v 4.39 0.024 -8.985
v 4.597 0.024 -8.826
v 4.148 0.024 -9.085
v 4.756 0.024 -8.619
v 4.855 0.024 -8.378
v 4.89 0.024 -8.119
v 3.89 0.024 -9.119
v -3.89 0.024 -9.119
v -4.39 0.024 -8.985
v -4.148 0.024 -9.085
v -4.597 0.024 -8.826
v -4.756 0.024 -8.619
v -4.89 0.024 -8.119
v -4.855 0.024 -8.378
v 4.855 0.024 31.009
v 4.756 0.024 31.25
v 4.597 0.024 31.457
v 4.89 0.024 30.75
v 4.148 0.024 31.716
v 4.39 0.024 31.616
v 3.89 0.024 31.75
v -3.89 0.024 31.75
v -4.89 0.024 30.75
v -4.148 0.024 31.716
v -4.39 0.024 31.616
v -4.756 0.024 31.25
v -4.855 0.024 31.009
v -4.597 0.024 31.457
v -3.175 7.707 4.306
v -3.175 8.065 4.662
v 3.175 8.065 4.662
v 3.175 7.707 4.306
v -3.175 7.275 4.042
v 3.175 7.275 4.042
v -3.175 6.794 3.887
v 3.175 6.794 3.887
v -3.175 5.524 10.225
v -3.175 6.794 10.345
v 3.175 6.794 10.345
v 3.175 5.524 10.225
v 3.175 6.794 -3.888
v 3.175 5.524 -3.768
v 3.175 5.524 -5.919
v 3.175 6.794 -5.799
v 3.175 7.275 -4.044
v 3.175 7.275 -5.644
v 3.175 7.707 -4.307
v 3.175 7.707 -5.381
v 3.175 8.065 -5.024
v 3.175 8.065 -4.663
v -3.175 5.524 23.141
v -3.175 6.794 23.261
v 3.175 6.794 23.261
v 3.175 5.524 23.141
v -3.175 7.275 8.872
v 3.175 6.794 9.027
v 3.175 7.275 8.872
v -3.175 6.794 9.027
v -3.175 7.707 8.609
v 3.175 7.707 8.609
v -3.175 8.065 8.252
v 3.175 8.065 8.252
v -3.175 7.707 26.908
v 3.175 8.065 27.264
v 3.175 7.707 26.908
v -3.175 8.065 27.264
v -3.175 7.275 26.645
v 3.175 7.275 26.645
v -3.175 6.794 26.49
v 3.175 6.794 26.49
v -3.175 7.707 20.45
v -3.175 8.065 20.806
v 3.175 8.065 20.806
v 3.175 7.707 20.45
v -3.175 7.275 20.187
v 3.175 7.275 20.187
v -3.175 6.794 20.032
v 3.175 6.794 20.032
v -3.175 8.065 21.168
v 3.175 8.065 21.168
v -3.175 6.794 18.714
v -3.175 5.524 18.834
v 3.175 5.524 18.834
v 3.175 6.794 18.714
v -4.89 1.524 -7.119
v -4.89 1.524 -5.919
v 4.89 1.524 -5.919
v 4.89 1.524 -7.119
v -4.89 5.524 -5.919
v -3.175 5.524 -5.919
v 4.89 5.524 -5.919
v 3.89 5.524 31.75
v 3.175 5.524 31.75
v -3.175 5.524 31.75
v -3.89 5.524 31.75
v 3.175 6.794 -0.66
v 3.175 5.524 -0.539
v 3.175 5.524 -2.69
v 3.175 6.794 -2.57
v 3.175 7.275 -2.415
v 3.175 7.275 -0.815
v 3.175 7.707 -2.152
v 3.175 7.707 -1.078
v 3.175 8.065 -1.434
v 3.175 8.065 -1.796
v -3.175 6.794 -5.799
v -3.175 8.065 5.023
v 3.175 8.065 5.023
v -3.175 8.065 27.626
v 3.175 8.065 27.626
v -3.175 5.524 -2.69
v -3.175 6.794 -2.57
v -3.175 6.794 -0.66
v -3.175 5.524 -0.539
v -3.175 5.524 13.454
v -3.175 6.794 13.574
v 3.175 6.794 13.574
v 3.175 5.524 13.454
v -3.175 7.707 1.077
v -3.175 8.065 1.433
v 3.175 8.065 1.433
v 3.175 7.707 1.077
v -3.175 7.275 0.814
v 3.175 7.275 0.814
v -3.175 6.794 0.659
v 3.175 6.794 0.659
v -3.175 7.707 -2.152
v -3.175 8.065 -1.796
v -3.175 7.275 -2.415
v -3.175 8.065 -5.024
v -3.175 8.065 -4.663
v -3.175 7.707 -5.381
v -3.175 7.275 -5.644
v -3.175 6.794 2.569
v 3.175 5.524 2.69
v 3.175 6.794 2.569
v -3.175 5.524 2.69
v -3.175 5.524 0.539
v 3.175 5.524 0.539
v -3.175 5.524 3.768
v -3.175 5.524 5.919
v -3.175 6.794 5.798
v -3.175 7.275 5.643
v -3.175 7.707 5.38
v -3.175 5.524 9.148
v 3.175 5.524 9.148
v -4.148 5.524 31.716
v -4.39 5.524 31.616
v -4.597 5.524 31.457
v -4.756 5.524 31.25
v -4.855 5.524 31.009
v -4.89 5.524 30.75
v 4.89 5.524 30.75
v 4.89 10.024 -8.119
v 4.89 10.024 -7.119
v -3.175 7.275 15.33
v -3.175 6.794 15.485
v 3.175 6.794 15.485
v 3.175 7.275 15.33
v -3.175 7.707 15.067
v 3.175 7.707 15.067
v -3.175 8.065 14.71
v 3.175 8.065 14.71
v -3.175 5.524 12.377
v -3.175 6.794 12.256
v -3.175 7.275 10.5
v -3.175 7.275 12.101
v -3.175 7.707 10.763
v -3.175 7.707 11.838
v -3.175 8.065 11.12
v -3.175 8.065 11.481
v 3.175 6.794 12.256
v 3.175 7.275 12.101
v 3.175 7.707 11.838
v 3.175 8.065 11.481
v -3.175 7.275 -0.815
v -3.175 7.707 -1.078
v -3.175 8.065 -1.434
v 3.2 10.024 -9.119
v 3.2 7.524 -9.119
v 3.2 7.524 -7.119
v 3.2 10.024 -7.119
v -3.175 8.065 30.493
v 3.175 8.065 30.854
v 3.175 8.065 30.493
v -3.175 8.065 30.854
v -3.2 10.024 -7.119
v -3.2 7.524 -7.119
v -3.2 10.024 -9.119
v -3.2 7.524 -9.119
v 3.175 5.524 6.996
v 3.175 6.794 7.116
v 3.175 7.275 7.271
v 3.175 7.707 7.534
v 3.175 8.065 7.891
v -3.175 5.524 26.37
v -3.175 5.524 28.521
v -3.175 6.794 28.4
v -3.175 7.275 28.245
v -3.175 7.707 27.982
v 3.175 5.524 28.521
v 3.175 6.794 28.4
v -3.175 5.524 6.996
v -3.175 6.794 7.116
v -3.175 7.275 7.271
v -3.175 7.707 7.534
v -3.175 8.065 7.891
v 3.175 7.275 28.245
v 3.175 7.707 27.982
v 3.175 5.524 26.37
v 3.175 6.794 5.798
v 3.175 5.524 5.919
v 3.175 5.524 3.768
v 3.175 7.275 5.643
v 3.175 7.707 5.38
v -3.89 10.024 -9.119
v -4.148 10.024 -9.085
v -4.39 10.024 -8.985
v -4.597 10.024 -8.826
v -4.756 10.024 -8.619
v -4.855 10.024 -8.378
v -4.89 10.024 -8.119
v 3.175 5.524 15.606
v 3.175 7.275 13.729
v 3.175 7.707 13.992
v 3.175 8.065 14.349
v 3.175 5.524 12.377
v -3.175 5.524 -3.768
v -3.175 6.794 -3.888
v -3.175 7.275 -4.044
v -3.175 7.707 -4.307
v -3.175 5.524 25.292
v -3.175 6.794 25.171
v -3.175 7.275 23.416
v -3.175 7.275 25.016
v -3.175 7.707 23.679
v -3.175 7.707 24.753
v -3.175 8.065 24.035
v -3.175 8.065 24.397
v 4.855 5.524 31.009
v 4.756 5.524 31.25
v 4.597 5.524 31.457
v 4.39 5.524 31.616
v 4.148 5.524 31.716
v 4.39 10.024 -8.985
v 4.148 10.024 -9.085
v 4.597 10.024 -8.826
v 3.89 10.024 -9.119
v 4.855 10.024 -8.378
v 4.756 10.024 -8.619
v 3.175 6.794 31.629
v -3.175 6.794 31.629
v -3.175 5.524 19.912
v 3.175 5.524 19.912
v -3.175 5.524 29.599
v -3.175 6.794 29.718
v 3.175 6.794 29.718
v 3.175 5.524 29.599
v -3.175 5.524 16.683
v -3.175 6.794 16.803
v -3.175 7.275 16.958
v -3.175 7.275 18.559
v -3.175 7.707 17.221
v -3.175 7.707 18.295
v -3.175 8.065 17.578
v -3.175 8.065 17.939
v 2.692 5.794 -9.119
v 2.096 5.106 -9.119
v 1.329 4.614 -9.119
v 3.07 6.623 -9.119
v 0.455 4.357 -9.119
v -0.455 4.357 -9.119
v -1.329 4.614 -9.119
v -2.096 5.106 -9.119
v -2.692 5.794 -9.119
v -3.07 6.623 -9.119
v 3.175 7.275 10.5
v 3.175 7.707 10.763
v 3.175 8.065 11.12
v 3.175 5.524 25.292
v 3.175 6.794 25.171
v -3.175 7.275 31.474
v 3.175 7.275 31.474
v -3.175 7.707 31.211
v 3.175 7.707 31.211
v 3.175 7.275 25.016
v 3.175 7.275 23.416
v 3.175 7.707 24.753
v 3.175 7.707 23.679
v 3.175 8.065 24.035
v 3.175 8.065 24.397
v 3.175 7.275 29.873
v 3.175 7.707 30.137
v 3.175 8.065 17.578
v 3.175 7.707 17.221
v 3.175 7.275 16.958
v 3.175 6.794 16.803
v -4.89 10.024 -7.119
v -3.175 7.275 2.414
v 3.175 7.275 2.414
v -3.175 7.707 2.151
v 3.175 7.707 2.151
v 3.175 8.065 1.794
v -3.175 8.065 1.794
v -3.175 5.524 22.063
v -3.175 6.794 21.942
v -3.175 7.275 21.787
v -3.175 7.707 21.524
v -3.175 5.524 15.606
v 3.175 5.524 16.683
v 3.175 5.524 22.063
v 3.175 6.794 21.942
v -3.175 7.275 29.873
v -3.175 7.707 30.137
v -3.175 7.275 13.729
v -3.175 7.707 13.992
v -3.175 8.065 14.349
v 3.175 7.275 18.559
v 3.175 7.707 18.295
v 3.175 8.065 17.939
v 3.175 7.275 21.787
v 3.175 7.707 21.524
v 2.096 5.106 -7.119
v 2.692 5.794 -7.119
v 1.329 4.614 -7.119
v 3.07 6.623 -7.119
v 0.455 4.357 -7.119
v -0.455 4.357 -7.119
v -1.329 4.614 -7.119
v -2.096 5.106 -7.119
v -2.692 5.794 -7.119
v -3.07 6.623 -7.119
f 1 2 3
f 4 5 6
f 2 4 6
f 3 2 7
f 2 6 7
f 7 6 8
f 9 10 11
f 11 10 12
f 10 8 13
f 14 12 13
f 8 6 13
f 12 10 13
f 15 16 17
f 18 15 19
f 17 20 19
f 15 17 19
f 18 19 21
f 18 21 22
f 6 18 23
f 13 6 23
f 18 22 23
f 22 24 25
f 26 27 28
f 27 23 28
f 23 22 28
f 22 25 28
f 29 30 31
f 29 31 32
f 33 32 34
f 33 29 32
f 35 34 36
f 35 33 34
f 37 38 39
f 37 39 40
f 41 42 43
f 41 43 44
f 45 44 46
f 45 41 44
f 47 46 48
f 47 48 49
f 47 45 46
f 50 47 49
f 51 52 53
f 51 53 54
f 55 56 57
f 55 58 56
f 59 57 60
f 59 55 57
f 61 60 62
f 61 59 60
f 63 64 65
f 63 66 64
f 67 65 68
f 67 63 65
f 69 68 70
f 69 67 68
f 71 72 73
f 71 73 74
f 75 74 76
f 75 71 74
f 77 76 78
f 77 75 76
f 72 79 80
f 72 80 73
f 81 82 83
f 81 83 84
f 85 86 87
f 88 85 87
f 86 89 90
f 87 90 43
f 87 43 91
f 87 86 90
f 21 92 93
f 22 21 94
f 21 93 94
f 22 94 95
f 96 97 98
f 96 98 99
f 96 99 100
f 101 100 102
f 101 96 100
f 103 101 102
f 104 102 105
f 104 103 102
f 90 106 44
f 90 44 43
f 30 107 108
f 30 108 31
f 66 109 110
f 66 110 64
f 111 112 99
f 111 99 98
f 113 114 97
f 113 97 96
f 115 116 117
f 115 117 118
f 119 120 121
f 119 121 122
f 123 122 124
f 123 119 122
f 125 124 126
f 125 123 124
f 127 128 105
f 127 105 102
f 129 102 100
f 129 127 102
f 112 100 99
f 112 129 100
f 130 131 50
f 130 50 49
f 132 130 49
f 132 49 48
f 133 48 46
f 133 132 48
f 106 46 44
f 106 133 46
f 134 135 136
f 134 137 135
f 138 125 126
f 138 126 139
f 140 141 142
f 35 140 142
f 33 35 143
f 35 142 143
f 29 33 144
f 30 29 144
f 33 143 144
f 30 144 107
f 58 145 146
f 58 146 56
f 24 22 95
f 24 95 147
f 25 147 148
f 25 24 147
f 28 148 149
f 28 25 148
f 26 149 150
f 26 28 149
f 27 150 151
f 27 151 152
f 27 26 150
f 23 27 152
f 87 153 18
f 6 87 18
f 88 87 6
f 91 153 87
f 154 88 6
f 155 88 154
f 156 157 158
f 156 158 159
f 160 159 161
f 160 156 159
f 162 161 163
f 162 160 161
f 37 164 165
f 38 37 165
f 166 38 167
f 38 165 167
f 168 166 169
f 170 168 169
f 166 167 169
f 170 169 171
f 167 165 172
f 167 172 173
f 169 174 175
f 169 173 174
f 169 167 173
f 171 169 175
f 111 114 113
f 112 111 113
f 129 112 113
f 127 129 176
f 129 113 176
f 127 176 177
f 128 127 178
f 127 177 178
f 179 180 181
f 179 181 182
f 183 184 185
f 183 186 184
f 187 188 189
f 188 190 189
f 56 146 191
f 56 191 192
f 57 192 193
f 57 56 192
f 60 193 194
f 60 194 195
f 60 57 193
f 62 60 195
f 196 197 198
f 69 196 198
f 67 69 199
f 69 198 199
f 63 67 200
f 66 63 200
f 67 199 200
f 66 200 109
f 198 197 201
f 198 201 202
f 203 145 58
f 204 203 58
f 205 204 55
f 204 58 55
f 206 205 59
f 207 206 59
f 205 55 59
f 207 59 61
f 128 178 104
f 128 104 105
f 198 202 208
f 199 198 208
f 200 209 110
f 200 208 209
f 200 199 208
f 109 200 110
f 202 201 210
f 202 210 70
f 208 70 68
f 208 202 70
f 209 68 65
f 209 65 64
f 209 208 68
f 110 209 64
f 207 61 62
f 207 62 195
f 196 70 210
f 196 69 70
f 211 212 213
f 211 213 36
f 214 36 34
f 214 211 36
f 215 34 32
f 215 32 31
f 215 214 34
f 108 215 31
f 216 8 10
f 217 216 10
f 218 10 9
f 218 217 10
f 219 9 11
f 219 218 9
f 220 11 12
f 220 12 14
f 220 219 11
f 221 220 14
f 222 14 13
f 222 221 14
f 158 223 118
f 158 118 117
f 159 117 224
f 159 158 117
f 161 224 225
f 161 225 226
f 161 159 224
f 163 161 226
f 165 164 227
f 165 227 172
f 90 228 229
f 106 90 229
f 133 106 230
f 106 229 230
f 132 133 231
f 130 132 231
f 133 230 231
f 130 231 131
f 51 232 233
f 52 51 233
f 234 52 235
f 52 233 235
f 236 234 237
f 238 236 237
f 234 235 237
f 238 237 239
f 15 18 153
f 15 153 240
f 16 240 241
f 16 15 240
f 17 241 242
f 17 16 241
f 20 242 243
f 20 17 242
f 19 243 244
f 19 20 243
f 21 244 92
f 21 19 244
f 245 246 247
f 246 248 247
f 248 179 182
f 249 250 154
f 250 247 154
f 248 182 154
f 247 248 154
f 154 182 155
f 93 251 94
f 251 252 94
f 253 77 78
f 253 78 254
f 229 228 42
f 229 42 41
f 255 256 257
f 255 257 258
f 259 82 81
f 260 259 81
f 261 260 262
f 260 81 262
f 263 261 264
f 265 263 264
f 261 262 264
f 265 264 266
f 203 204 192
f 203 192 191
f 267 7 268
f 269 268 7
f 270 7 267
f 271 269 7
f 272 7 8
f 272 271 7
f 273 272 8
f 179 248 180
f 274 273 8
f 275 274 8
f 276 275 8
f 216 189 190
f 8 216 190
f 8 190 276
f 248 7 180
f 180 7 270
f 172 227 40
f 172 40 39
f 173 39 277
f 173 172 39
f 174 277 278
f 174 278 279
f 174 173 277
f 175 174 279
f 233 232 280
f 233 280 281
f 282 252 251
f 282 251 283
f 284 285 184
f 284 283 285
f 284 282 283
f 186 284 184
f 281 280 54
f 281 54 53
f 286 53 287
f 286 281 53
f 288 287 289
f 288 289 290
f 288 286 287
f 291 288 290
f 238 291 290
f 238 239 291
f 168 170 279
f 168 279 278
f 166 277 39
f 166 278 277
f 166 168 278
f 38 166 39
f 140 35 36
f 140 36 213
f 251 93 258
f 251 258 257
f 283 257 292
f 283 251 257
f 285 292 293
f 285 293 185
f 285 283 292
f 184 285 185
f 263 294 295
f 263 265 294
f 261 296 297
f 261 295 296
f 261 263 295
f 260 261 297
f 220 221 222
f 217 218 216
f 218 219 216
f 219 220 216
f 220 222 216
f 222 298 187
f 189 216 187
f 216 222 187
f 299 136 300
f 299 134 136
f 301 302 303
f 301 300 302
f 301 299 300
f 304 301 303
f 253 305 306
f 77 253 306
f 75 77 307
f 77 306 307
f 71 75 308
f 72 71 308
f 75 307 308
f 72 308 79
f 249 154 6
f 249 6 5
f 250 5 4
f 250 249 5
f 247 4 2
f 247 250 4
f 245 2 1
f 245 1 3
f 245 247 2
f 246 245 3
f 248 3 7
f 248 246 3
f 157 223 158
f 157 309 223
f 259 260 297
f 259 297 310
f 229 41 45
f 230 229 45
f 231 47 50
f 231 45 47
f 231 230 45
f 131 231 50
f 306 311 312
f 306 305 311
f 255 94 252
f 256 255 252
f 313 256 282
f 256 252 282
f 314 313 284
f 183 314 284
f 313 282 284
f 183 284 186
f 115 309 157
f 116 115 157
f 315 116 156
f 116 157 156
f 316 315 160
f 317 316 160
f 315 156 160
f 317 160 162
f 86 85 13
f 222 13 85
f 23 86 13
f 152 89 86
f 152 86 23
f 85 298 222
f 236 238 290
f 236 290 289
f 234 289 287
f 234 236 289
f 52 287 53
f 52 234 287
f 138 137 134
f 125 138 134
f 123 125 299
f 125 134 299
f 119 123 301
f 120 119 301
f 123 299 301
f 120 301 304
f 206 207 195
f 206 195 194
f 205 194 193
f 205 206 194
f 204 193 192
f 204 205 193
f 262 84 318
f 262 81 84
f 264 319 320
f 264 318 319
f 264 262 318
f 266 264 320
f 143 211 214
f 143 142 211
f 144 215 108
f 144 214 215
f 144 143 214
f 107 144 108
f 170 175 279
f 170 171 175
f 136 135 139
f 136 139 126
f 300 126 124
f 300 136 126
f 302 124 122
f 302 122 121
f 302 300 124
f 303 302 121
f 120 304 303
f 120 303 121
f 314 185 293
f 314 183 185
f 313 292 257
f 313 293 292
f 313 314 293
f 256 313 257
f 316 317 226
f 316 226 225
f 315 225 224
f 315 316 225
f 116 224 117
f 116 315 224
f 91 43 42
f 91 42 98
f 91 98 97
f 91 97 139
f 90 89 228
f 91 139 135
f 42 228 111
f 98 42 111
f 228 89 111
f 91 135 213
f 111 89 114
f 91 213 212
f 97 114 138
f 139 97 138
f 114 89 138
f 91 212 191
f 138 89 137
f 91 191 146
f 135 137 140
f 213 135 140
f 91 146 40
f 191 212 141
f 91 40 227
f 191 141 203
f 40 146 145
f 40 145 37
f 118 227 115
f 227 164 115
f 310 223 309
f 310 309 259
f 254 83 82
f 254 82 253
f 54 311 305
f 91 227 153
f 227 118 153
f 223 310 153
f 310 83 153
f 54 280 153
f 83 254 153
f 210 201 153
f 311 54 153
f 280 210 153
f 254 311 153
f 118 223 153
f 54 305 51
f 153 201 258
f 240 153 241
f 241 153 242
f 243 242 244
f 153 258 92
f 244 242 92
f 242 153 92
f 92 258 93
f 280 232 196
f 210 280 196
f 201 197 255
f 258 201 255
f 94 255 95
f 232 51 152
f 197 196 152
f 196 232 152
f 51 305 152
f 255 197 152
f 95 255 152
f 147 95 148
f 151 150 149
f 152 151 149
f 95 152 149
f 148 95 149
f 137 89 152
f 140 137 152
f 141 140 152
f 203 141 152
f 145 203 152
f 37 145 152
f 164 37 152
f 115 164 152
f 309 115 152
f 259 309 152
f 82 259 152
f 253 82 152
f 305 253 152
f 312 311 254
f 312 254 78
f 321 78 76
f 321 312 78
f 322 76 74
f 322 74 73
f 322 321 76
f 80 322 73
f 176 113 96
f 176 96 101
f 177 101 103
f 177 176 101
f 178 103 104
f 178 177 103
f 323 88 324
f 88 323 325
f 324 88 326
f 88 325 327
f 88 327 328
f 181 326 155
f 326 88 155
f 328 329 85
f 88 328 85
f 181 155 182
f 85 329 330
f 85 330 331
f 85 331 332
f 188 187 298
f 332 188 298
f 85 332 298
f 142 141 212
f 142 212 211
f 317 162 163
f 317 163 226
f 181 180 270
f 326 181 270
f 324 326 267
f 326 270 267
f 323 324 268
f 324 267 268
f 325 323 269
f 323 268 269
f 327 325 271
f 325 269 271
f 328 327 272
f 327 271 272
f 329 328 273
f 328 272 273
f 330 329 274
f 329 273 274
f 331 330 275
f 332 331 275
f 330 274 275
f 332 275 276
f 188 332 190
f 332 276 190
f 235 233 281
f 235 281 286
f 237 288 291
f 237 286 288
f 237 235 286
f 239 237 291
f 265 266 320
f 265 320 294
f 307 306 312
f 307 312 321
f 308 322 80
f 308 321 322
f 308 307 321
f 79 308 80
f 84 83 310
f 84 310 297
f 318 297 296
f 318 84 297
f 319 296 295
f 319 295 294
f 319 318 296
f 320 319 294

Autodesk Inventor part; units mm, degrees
ref_plane "YZ Plane" through (0, 0, 0) normal (1, 0, 0) x (0, 1, 0)
ref_plane "XZ Plane" through (0, 0, 0) normal (0, 1, 0) x (-1, 0, 0)
ref_plane "XY Plane" through (0, 0, 0) normal (0, 0, 1) x (1, 0, 0)
sketch "Sketch2" plane through (0, 0, 0) normal (1, 0, 0) x (0, 1, 0)
  line L0 (-5.5245, 31.75) -> (-5.5245, -31.75)
  line L1 (-5.5245, -31.75) -> (5.5245, -31.75)
  line L2 (5.5245, -31.75) -> (5.5245, 31.75)
  line L3 (5.5245, 31.75) -> (-5.5245, 31.75)
  line L4 (-5.5245, 31.75) -> (5.5245, -31.75) construction
  line L5 (-5.5245, -31.75) -> (5.5245, 31.75) construction
  point P0 (0, 0)
  dimension "d4" = 63.5
  dimension "d5" = 11.049
extrude "Extrusion2" add sketch "Sketch2" along normal mid plane 9.779
sketch "Sketch3" plane through (0, 0, 0) normal (1, 0, 0) x (0, 1, 0)
  line L0 (5.5245, -31.75) -> (5.5245, 31.75) projected
  line L1 (5.5245, 31.9532) -> (5.5245, 29.4132)
  line L2 (5.5245, 31.9532) -> (5.5245, 29.4132)
  arc A0 (8.0645, 30.8543) -> (6.7945, 31.629) centre (6.3804, 29.5218) ccw
  line L3 (8.0645, 30.6737) -> (7.6408, 30.6737)
  arc A1 (6.7945, 29.7184) -> (8.0645, 30.4931) centre (6.3804, 31.8256) ccw
  line L4 (8.0645, 30.8543) -> (8.0645, 30.4931)
  line L5 (5.5245, 31.75) -> (5.5245, -31.75)
  arc A2 (8.0642, -1.6042) -> (8.0645, -1.6033) centre (6.6313, -1.0154) ccw
  line L6 (6.7945, 31.629) -> (5.5245, 31.7489)
  line L7 (6.7945, 29.7184) -> (5.5245, 29.5986)
  line L8 (5.5245, 31.7489) -> (6.7945, 31.629)
  line L9 (6.7945, 29.7184) -> (5.5245, 29.5986)
  line L10 (5.5245, 29.5986) -> (5.5245, 31.7489)
  arc A3 (8.0645, 30.8543) -> (6.7945, 31.629) centre (6.3804, 29.5218) ccw
  arc A4 (6.7945, 29.7184) -> (8.0645, 30.4931) centre (6.3804, 31.8256) ccw
  line L11 (8.0645, 30.8543) -> (8.0645, 30.4931)
  line L12 (8.0645, 27.4448) -> (7.6408, 27.4448)
  line L13 (8.0645, 27.6255) -> (8.0645, 27.2642)
  line L14 (8.0645, 27.6255) -> (8.0645, 27.2642)
  arc A5 (6.7945, 26.4895) -> (8.0645, 27.2642) centre (6.3804, 28.5967) ccw
  arc A6 (8.0645, 27.6255) -> (6.7945, 28.4002) centre (6.3804, 26.293) ccw
  arc A7 (6.7945, 26.4895) -> (8.0645, 27.2642) centre (6.3804, 28.5967) ccw
  arc A8 (8.0645, 27.6255) -> (6.7945, 28.4002) centre (6.3804, 26.293) ccw
  line L15 (5.5245, 28.5211) -> (5.5245, -34.9788)
  line L16 (5.5245, 28.7243) -> (5.5245, 26.1843)
  line L17 (6.7945, 26.4895) -> (5.5245, 26.3697)
  line L18 (5.5245, 28.52) -> (6.7945, 28.4002)
  line L19 (6.7945, 26.4895) -> (5.5245, 26.3697)
  line L20 (5.5245, 26.3697) -> (5.5245, 28.52)
  line L21 (5.5245, 28.7243) -> (5.5245, 26.1843)
  line L22 (6.7945, 28.4002) -> (5.5245, 28.52)
  line L23 (8.0645, 24.216) -> (7.6408, 24.216)
  line L24 (8.0645, 24.3966) -> (8.0645, 24.0353)
  line L25 (8.0645, 24.3966) -> (8.0645, 24.0353)
  arc A9 (6.7945, 23.2606) -> (8.0645, 24.0353) centre (6.3804, 25.3678) ccw
  arc A10 (8.0645, 24.3966) -> (6.7945, 25.1713) centre (6.3804, 23.0641) ccw
  arc A11 (6.7945, 23.2606) -> (8.0645, 24.0353) centre (6.3804, 25.3678) ccw
  arc A12 (8.0645, 24.3966) -> (6.7945, 25.1713) centre (6.3804, 23.0641) ccw
  line L26 (5.5245, 25.2923) -> (5.5245, -38.2077)
  line L27 (5.5245, 25.4955) -> (5.5245, 22.9555)
  line L28 (6.7945, 23.2606) -> (5.5245, 23.1408)
  line L29 (5.5245, 25.2911) -> (6.7945, 25.1713)
  line L30 (6.7945, 23.2606) -> (5.5245, 23.1408)
  line L31 (5.5245, 23.1408) -> (5.5245, 25.2911)
  line L32 (5.5245, 25.4955) -> (5.5245, 22.9555)
  line L33 (6.7945, 25.1713) -> (5.5245, 25.2911)
  line L34 (8.0645, 20.9871) -> (7.6408, 20.9871)
  line L35 (8.0645, 21.1677) -> (8.0645, 20.8065)
  line L36 (8.0645, 21.1677) -> (8.0645, 20.8065)
  arc A13 (6.7945, 20.0318) -> (8.0645, 20.8065) centre (6.3804, 22.139) ccw
  arc A14 (8.0645, 21.1677) -> (6.7945, 21.9424) centre (6.3804, 19.8352) ccw
  arc A15 (6.7945, 20.0318) -> (8.0645, 20.8065) centre (6.3804, 22.139) ccw
  arc A16 (8.0645, 21.1677) -> (6.7945, 21.9424) centre (6.3804, 19.8352) ccw
  line L37 (5.5245, 22.0634) -> (5.5245, -41.4366)
  line L38 (5.5245, 22.2666) -> (5.5245, 19.7266)
  line L39 (6.7945, 20.0318) -> (5.5245, 19.9119)
  line L40 (5.5245, 22.0623) -> (6.7945, 21.9424)
  line L41 (6.7945, 20.0318) -> (5.5245, 19.9119)
  line L42 (5.5245, 19.9119) -> (5.5245, 22.0623)
  line L43 (5.5245, 22.2666) -> (5.5245, 19.7266)
  line L44 (6.7945, 21.9424) -> (5.5245, 22.0623)
  line L45 (8.0645, 17.7582) -> (7.6408, 17.7582)
  line L46 (8.0645, 17.9389) -> (8.0645, 17.5776)
  line L47 (8.0645, 17.9389) -> (8.0645, 17.5776)
  arc A17 (6.7945, 16.8029) -> (8.0645, 17.5776) centre (6.3804, 18.9101) ccw
  arc A18 (8.0645, 17.9389) -> (6.7945, 18.7136) centre (6.3804, 16.6064) ccw
  arc A19 (6.7945, 16.8029) -> (8.0645, 17.5776) centre (6.3804, 18.9101) ccw
  arc A20 (8.0645, 17.9389) -> (6.7945, 18.7136) centre (6.3804, 16.6064) ccw
  line L48 (5.5245, 18.8345) -> (5.5245, -44.6655)
  line L49 (5.5245, 19.0377) -> (5.5245, 16.4977)
  line L50 (6.7945, 16.8029) -> (5.5245, 16.6831)
  line L51 (5.5245, 18.8334) -> (6.7945, 18.7136)
  line L52 (6.7945, 16.8029) -> (5.5245, 16.6831)
  line L53 (5.5245, 16.6831) -> (5.5245, 18.8334)
  line L54 (5.5245, 19.0377) -> (5.5245, 16.4977)
  line L55 (6.7945, 18.7136) -> (5.5245, 18.8334)
  line L56 (8.0645, 14.5294) -> (7.6408, 14.5294)
  line L57 (8.0645, 14.71) -> (8.0645, 14.3487)
  line L58 (8.0645, 14.71) -> (8.0645, 14.3487)
  arc A21 (6.7945, 13.574) -> (8.0645, 14.3487) centre (6.3804, 15.6812) ccw
  arc A22 (8.0645, 14.71) -> (6.7945, 15.4847) centre (6.3804, 13.3775) ccw
  arc A23 (6.7945, 13.574) -> (8.0645, 14.3487) centre (6.3804, 15.6812) ccw
  arc A24 (8.0645, 14.71) -> (6.7945, 15.4847) centre (6.3804, 13.3775) ccw
  line L59 (5.5245, 15.6057) -> (5.5245, -47.8943)
  line L60 (5.5245, 15.8089) -> (5.5245, 13.2689)
  line L61 (6.7945, 13.574) -> (5.5245, 13.4542)
  line L62 (5.5245, 15.6045) -> (6.7945, 15.4847)
  line L63 (6.7945, 13.574) -> (5.5245, 13.4542)
  line L64 (5.5245, 13.4542) -> (5.5245, 15.6045)
  line L65 (5.5245, 15.8089) -> (5.5245, 13.2689)
  line L66 (6.7945, 15.4847) -> (5.5245, 15.6045)
  line L67 (8.0645, 11.3005) -> (7.6408, 11.3005)
  line L68 (8.0645, 11.4811) -> (8.0645, 11.1199)
  line L69 (8.0645, 11.4811) -> (8.0645, 11.1199)
  arc A25 (6.7945, 10.3452) -> (8.0645, 11.1199) centre (6.3804, 12.4524) ccw
  arc A26 (8.0645, 11.4811) -> (6.7945, 12.2558) centre (6.3804, 10.1486) ccw
  arc A27 (6.7945, 10.3452) -> (8.0645, 11.1199) centre (6.3804, 12.4524) ccw
  arc A28 (8.0645, 11.4811) -> (6.7945, 12.2558) centre (6.3804, 10.1486) ccw
  line L70 (5.5245, 12.3768) -> (5.5245, -51.1232)
  line L71 (5.5245, 12.58) -> (5.5245, 10.04)
  line L72 (6.7945, 10.3452) -> (5.5245, 10.2253)
  line L73 (5.5245, 12.3756) -> (6.7945, 12.2558)
  line L74 (6.7945, 10.3452) -> (5.5245, 10.2253)
  line L75 (5.5245, 10.2253) -> (5.5245, 12.3756)
  line L76 (5.5245, 12.58) -> (5.5245, 10.04)
  line L77 (6.7945, 12.2558) -> (5.5245, 12.3756)
  line L78 (8.0645, 8.0716) -> (7.6408, 8.0716)
  line L79 (8.0645, 8.2523) -> (8.0645, 7.891)
  line L80 (8.0645, 8.2523) -> (8.0645, 7.891)
  arc A29 (6.7945, 7.1163) -> (8.0645, 7.891) centre (6.3804, 9.2235) ccw
  arc A30 (8.0645, 8.2523) -> (6.7945, 9.027) centre (6.3804, 6.9198) ccw
  arc A31 (6.7945, 7.1163) -> (8.0645, 7.891) centre (6.3804, 9.2235) ccw
  arc A32 (8.0645, 8.2523) -> (6.7945, 9.027) centre (6.3804, 6.9198) ccw
  line L81 (5.5245, 9.1479) -> (5.5245, -54.3521)
  line L82 (5.5245, 9.3511) -> (5.5245, 6.8111)
  line L83 (6.7945, 7.1163) -> (5.5245, 6.9965)
  line L84 (5.5245, 9.1468) -> (6.7945, 9.027)
  line L85 (6.7945, 7.1163) -> (5.5245, 6.9965)
  line L86 (5.5245, 6.9965) -> (5.5245, 9.1468)
  line L87 (5.5245, 9.3511) -> (5.5245, 6.8111)
  line L88 (6.7945, 9.027) -> (5.5245, 9.1468)
  line L89 (8.0645, 4.8428) -> (7.6408, 4.8428)
  line L90 (8.0645, 5.0234) -> (8.0645, 4.6621)
  line L91 (8.0645, 5.0234) -> (8.0645, 4.6621)
  arc A33 (6.7945, 3.8874) -> (8.0645, 4.6621) centre (6.3804, 5.9946) ccw
  arc A34 (8.0645, 5.0234) -> (6.7945, 5.7981) centre (6.3804, 3.6909) ccw
  arc A35 (6.7945, 3.8874) -> (8.0645, 4.6621) centre (6.3804, 5.9946) ccw
  arc A36 (8.0645, 5.0234) -> (6.7945, 5.7981) centre (6.3804, 3.6909) ccw
  line L92 (5.5245, 5.9191) -> (5.5245, -57.5809)
  line L93 (5.5245, 6.1223) -> (5.5245, 3.5823)
  line L94 (6.7945, 3.8874) -> (5.5245, 3.7676)
  line L95 (5.5245, 5.9179) -> (6.7945, 5.7981)
  line L96 (6.7945, 3.8874) -> (5.5245, 3.7676)
  line L97 (5.5245, 3.7676) -> (5.5245, 5.9179)
  line L98 (5.5245, 6.1223) -> (5.5245, 3.5823)
  line L99 (6.7945, 5.7981) -> (5.5245, 5.9179)
  line L100 (8.0645, 1.6139) -> (7.6408, 1.6139)
  line L101 (8.0645, 1.7945) -> (8.0645, 1.4333)
  line L102 (8.0645, 1.7945) -> (8.0645, 1.4333)
  arc A37 (6.7945, 0.6586) -> (8.0645, 1.4333) centre (6.3804, 2.7658) ccw
  arc A38 (8.0645, 1.7945) -> (6.7945, 2.5692) centre (6.3804, 0.462) ccw
  arc A39 (6.7945, 0.6586) -> (8.0645, 1.4333) centre (6.3804, 2.7658) ccw
  arc A40 (8.0645, 1.7945) -> (6.7945, 2.5692) centre (6.3804, 0.462) ccw
  line L103 (5.5245, 2.6902) -> (5.5245, -60.8098)
  line L104 (5.5245, 2.8934) -> (5.5245, 0.3534)
  line L105 (6.7945, 0.6586) -> (5.5245, 0.5387)
  line L106 (5.5245, 2.689) -> (6.7945, 2.5692)
  line L107 (6.7945, 0.6586) -> (5.5245, 0.5387)
  line L108 (5.5245, 0.5387) -> (5.5245, 2.689)
  line L109 (5.5245, 2.8934) -> (5.5245, 0.3534)
  line L110 (6.7945, 2.5692) -> (5.5245, 2.689)
  line L111 (8.0645, -1.615) -> (7.6408, -1.615)
  line L112 (8.0645, -1.4344) -> (8.0645, -1.7956)
  line L113 (8.0645, -1.4344) -> (8.0645, -1.7956)
  arc A41 (6.7945, -2.5703) -> (8.0645, -1.7956) centre (6.3804, -0.4631) ccw
  arc A42 (8.0645, -1.4344) -> (6.7945, -0.6597) centre (6.3804, -2.7668) ccw
  arc A43 (6.7945, -2.5703) -> (8.0645, -1.7956) centre (6.3804, -0.4631) ccw
  arc A44 (8.0645, -1.4344) -> (6.7945, -0.6597) centre (6.3804, -2.7668) ccw
  line L114 (5.5245, -0.5387) -> (5.5245, -64.0387)
  line L115 (5.5245, -0.3355) -> (5.5245, -2.8755)
  line L116 (6.7945, -2.5703) -> (5.5245, -2.6901)
  line L117 (5.5245, -0.5398) -> (6.7945, -0.6597)
  line L118 (6.7945, -2.5703) -> (5.5245, -2.6901)
  line L119 (5.5245, -2.6901) -> (5.5245, -0.5398)
  line L120 (5.5245, -0.3355) -> (5.5245, -2.8755)
  line L121 (6.7945, -0.6597) -> (5.5245, -0.5398)
  line L122 (8.0645, -4.8438) -> (7.6408, -4.8438)
  line L123 (8.0645, -4.6632) -> (8.0645, -5.0245)
  line L124 (8.0645, -4.6632) -> (8.0645, -5.0245)
  arc A45 (6.7945, -5.7992) -> (8.0645, -5.0245) centre (6.3804, -3.692) ccw
  arc A46 (8.0645, -4.6632) -> (6.7945, -3.8885) centre (6.3804, -5.9957) ccw
  arc A47 (6.7945, -5.7992) -> (8.0645, -5.0245) centre (6.3804, -3.692) ccw
  arc A48 (8.0645, -4.6632) -> (6.7945, -3.8885) centre (6.3804, -5.9957) ccw
  line L125 (5.5245, -3.7676) -> (5.5245, -67.2675)
  line L126 (5.5245, -3.5644) -> (5.5245, -6.1044)
  line L127 (6.7945, -5.7992) -> (5.5245, -5.919)
  line L128 (5.5245, -3.7687) -> (6.7945, -3.8885)
  line L129 (6.7945, -5.7992) -> (5.5245, -5.919)
  line L130 (5.5245, -5.919) -> (5.5245, -3.7687)
  line L131 (5.5245, -3.5644) -> (5.5245, -6.1044)
  line L132 (6.7945, -3.8885) -> (5.5245, -3.7687)
  line L133 (8.0645, -8.0727) -> (7.6408, -8.0727)
  line L134 (8.0645, -7.8921) -> (8.0645, -8.2533)
  line L135 (8.0645, -7.8921) -> (8.0645, -8.2533)
  arc A49 (6.7945, -9.028) -> (8.0645, -8.2533) centre (6.3804, -6.9208) ccw
  arc A50 (8.0645, -7.8921) -> (6.7945, -7.1174) centre (6.3804, -9.2246) ccw
  arc A51 (6.7945, -9.028) -> (8.0645, -8.2533) centre (6.3804, -6.9208) ccw
  arc A52 (8.0645, -7.8921) -> (6.7945, -7.1174) centre (6.3804, -9.2246) ccw
  line L136 (5.5245, -6.9964) -> (5.5245, -70.4964)
  line L137 (5.5245, -6.7932) -> (5.5245, -9.3332)
  line L138 (6.7945, -9.028) -> (5.5245, -9.1479)
  line L139 (5.5245, -6.9976) -> (6.7945, -7.1174)
  line L140 (6.7945, -9.028) -> (5.5245, -9.1479)
  line L141 (5.5245, -9.1479) -> (5.5245, -6.9976)
  line L142 (5.5245, -6.7932) -> (5.5245, -9.3332)
  line L143 (6.7945, -7.1174) -> (5.5245, -6.9976)
  line L144 (8.0645, -11.3016) -> (7.6408, -11.3016)
  line L145 (8.0645, -11.121) -> (8.0645, -11.4822)
  line L146 (8.0645, -11.121) -> (8.0645, -11.4822)
  arc A53 (6.7945, -12.2569) -> (8.0645, -11.4822) centre (6.3804, -10.1497) ccw
  arc A54 (8.0645, -11.121) -> (6.7945, -10.3463) centre (6.3804, -12.4535) ccw
  arc A55 (6.7945, -12.2569) -> (8.0645, -11.4822) centre (6.3804, -10.1497) ccw
  arc A56 (8.0645, -11.121) -> (6.7945, -10.3463) centre (6.3804, -12.4535) ccw
  line L147 (5.5245, -10.2253) -> (5.5245, -73.7253)
  line L148 (5.5245, -10.0221) -> (5.5245, -12.5621)
  line L149 (6.7945, -12.2569) -> (5.5245, -12.3767)
  line L150 (5.5245, -10.2264) -> (6.7945, -10.3463)
  line L151 (6.7945, -12.2569) -> (5.5245, -12.3767)
  line L152 (5.5245, -12.3767) -> (5.5245, -10.2264)
  line L153 (5.5245, -10.0221) -> (5.5245, -12.5621)
  line L154 (6.7945, -10.3463) -> (5.5245, -10.2264)
  line L155 (8.0645, -14.5305) -> (7.6408, -14.5305)
  line L156 (8.0645, -14.3498) -> (8.0645, -14.7111)
  line L157 (8.0645, -14.3498) -> (8.0645, -14.7111)
  arc A57 (6.7945, -15.4858) -> (8.0645, -14.7111) centre (6.3804, -13.3786) ccw
  arc A58 (8.0645, -14.3498) -> (6.7945, -13.5751) centre (6.3804, -15.6823) ccw
  arc A59 (6.7945, -15.4858) -> (8.0645, -14.7111) centre (6.3804, -13.3786) ccw
  arc A60 (8.0645, -14.3498) -> (6.7945, -13.5751) centre (6.3804, -15.6823) ccw
  line L158 (5.5245, -13.4542) -> (5.5245, -76.9541)
  line L159 (5.5245, -13.251) -> (5.5245, -15.791)
  line L160 (6.7945, -15.4858) -> (5.5245, -15.6056)
  line L161 (5.5245, -13.4553) -> (6.7945, -13.5751)
  line L162 (6.7945, -15.4858) -> (5.5245, -15.6056)
  line L163 (5.5245, -15.6056) -> (5.5245, -13.4553)
  line L164 (5.5245, -13.251) -> (5.5245, -15.791)
  line L165 (6.7945, -13.5751) -> (5.5245, -13.4553)
  line L166 (8.0645, -17.7593) -> (7.6408, -17.7593)
  line L167 (8.0645, -17.5787) -> (8.0645, -17.9399)
  line L168 (8.0645, -17.5787) -> (8.0645, -17.9399)
  arc A61 (6.7945, -18.7146) -> (8.0645, -17.9399) centre (6.3804, -16.6075) ccw
  arc A62 (8.0645, -17.5787) -> (6.7945, -16.804) centre (6.3804, -18.9112) ccw
  arc A63 (6.7945, -18.7146) -> (8.0645, -17.9399) centre (6.3804, -16.6075) ccw
  arc A64 (8.0645, -17.5787) -> (6.7945, -16.804) centre (6.3804, -18.9112) ccw
  line L169 (5.5245, -16.683) -> (5.5245, -80.183)
  line L170 (5.5245, -16.4798) -> (5.5245, -19.0198)
  line L171 (6.7945, -18.7146) -> (5.5245, -18.8345)
  line L172 (5.5245, -16.6842) -> (6.7945, -16.804)
  line L173 (6.7945, -18.7146) -> (5.5245, -18.8345)
  line L174 (5.5245, -18.8345) -> (5.5245, -16.6842)
  line L175 (5.5245, -16.4798) -> (5.5245, -19.0198)
  line L176 (6.7945, -16.804) -> (5.5245, -16.6842)
  line L177 (8.0645, -20.9882) -> (7.6408, -20.9882)
  line L178 (8.0645, -20.8076) -> (8.0645, -21.1688)
  line L179 (8.0645, -20.8076) -> (8.0645, -21.1688)
  arc A65 (6.7945, -21.9435) -> (8.0645, -21.1688) centre (6.3804, -19.8363) ccw
  arc A66 (8.0645, -20.8076) -> (6.7945, -20.0329) centre (6.3804, -22.1401) ccw
  arc A67 (6.7945, -21.9435) -> (8.0645, -21.1688) centre (6.3804, -19.8363) ccw
  arc A68 (8.0645, -20.8076) -> (6.7945, -20.0329) centre (6.3804, -22.1401) ccw
  line L180 (5.5245, -19.9119) -> (5.5245, -83.4119)
  line L181 (5.5245, -19.7087) -> (5.5245, -22.2487)
  line L182 (6.7945, -21.9435) -> (5.5245, -22.0633)
  line L183 (5.5245, -19.913) -> (6.7945, -20.0329)
  line L184 (6.7945, -21.9435) -> (5.5245, -22.0633)
  line L185 (5.5245, -22.0633) -> (5.5245, -19.913)
  line L186 (5.5245, -19.7087) -> (5.5245, -22.2487)
  line L187 (6.7945, -20.0329) -> (5.5245, -19.913)
  line L188 (8.0645, -24.2171) -> (7.6408, -24.2171)
  line L189 (8.0645, -24.0364) -> (8.0645, -24.3977)
  line L190 (8.0645, -24.0364) -> (8.0645, -24.3977)
  arc A69 (6.7945, -25.1724) -> (8.0645, -24.3977) centre (6.3804, -23.0652) ccw
  arc A70 (8.0645, -24.0364) -> (6.7945, -23.2617) centre (6.3804, -25.3689) ccw
  arc A71 (6.7945, -25.1724) -> (8.0645, -24.3977) centre (6.3804, -23.0652) ccw
  arc A72 (8.0645, -24.0364) -> (6.7945, -23.2617) centre (6.3804, -25.3689) ccw
  line L191 (5.5245, -23.1408) -> (5.5245, -86.6407)
  line L192 (5.5245, -22.9376) -> (5.5245, -25.4776)
  line L193 (6.7945, -25.1724) -> (5.5245, -25.2922)
  line L194 (5.5245, -23.1419) -> (6.7945, -23.2617)
  line L195 (6.7945, -25.1724) -> (5.5245, -25.2922)
  line L196 (5.5245, -25.2922) -> (5.5245, -23.1419)
  line L197 (5.5245, -22.9376) -> (5.5245, -25.4776)
  line L198 (6.7945, -23.2617) -> (5.5245, -23.1419)
  line L199 (8.0645, -27.4459) -> (7.6408, -27.4459)
  line L200 (8.0645, -27.2653) -> (8.0645, -27.6266)
  line L201 (8.0645, -27.2653) -> (8.0645, -27.6266)
  arc A73 (6.7945, -28.4013) -> (8.0645, -27.6266) centre (6.3804, -26.2941) ccw
  arc A74 (8.0645, -27.2653) -> (6.7945, -26.4906) centre (6.3804, -28.5978) ccw
  arc A75 (6.7945, -28.4013) -> (8.0645, -27.6266) centre (6.3804, -26.2941) ccw
  arc A76 (8.0645, -27.2653) -> (6.7945, -26.4906) centre (6.3804, -28.5978) ccw
  line L202 (5.5245, -26.3696) -> (5.5245, -89.8696)
  line L203 (5.5245, -26.1664) -> (5.5245, -28.7064)
  line L204 (6.7945, -28.4013) -> (5.5245, -28.5211)
  line L205 (5.5245, -26.3708) -> (6.7945, -26.4906)
  line L206 (6.7945, -28.4013) -> (5.5245, -28.5211)
  line L207 (5.5245, -28.5211) -> (5.5245, -26.3708)
  line L208 (5.5245, -26.1664) -> (5.5245, -28.7064)
  line L209 (6.7945, -26.4906) -> (5.5245, -26.3708)
  line L210 (8.0645, -30.6748) -> (7.6408, -30.6748)
  line L211 (8.0645, -30.4942) -> (8.0645, -30.8554)
  line L212 (8.0645, -30.4942) -> (8.0645, -30.8554)
  arc A77 (6.7945, -31.6301) -> (8.0645, -30.8554) centre (6.3804, -29.5229) ccw
  arc A78 (8.0645, -30.4942) -> (6.7945, -29.7195) centre (6.3804, -31.8267) ccw
  arc A79 (6.7945, -31.6301) -> (8.0645, -30.8554) centre (6.3804, -29.5229) ccw
  arc A80 (8.0645, -30.4942) -> (6.7945, -29.7195) centre (6.3804, -31.8267) ccw
  line L213 (5.5245, -29.5985) -> (5.5245, -93.0985)
  line L214 (5.5245, -29.3953) -> (5.5245, -31.9353)
  line L215 (6.7945, -31.6301) -> (5.5245, -31.7499)
  line L216 (5.5245, -29.5996) -> (6.7945, -29.7195)
  line L217 (6.7945, -31.6301) -> (5.5245, -31.7499)
  line L218 (5.5245, -31.7499) -> (5.5245, -29.5996)
  line L219 (5.5245, -29.3953) -> (5.5245, -31.9353)
  line L220 (6.7945, -29.7195) -> (5.5245, -29.5996)
  point P0 (0, 0)
  point P1 (6.7953, 29.7185)
  point P2 (6.7953, 26.4897)
  point P3 (6.7953, 23.2608)
  point P4 (6.7953, 20.0319)
  point P5 (6.7953, 16.8031)
  point P6 (6.7953, 13.5742)
  point P7 (6.7953, 10.3453)
  point P8 (6.7953, 7.1164)
  point P9 (6.7953, 3.8876)
  point P10 (6.7953, 0.6587)
  point P11 (6.7953, -2.5702)
  point P12 (6.7953, -5.799)
  point P13 (6.7953, -9.0279)
  point P14 (6.7953, -12.2568)
  point P15 (6.7953, -15.4856)
  point P16 (6.7953, -18.7145)
  point P17 (6.7953, -21.9434)
  point P18 (6.7953, -25.1722)
  point P19 (6.7953, -28.4011)
  point P20 (6.7953, -31.63)
  dimension "d9" = 2.3368
  dimension "d63" = 84.61
  dimension "d64" = 84.61
  dimension "d74" = 3.2289
sketch "Sketch5" plane through (-4.8895, -5.5245, 31.75) normal (0, -1, 0) x (1, 0, 0)
  line L0 (9.779, 0) -> (9.779, -63.5) projected
  line L1 (9.779, 0) -> (0, 0) projected
  line L2 (0, -63.5) -> (0, 0) projected
  line L3 (0, -63.5) -> (0, 0) projected
  line L4 (0, -63.5) -> (9.779, -63.5) projected
  line L5 (0, -63.5) -> (9.779, -63.5) projected
  line L6 (9.779, 0) -> (9.779, -63.5) projected
  line L7 (9.779, 0) -> (0, 0) projected
  line L8 (0, -63.5) -> (0, 0) projected
  line L9 (9.779, 0) -> (9.779, -63.5) projected
  line L10 (9.779, 0) -> (0, 0) projected
  line L11 (0, -63.5) -> (9.779, -63.5) projected
  point P0 (4.8895, -31.75)
extrude "Extrusion6" add sketch "Sketch5" along normal blind 2.54
extrude "Extrusion8" add sketch "Sketch3" along normal mid plane 6.35 contours L0 L6 A0 L4 A1 L7 | L0 L18 A6 L13 A5 L17 | L0 L29 A10 L24 A9 L28 | L0 L40 A14 L35 A13 L39 | L0 L51 A18 L46 A17 L50 | L0 L62 A22 L57 A21 L61 | L0 L73 A26 L68 A25 L72 | L0 L84 A30 L79 A29 L83 | L0 L95 A34 L90 A33 L94 | L0 L106 A38 L101 A37 L105 | L0 A2 A41 L116 | L0 L128 A46 L123 A45 L127 | L0 L139 A50 L134 A49 L138 | L0 L150 A54 L145 A53 L149 | L0 L161 A58 L156 A57 L160 | L0 L172 A62 L167 A61 L171 | L0 L183 A66 L178 A65 L182 | L0 L194 A70 L189 A69 L193 | L0 L205 A74 L200 A73 L204 | L0 L216 A78 L211 A77 L215 | L0 L117 A42 L112 A2 A41 | A2 L111 L112 A41 | L112 L111 A2
sketch "Sketch14" plane through (-3.8895, 5.5245, 31.75) normal (0, 1, 0) x (1, 0, 0)
  line L0 (-2.3413, 37.669) -> (16.7384, 37.669)
  line L1 (16.7384, 37.669) -> (16.7384, 74.3036)
  line L2 (16.7384, 74.3036) -> (-2.3413, 74.3036)
  line L3 (-2.3413, 74.3036) -> (-2.3413, 37.669)
  line L4 (8.779, 0) -> (-1, 0) projected
  line L5 (-1, 0) -> (12.5409, 0)
  line L6 (12.5409, 0) -> (12.5409, -8.7328)
  line L7 (12.5409, -8.7328) -> (-1, -8.7328)
  line L8 (-1, -8.7328) -> (-1, 0)
  point P0 (3.8895, 31.75)
extrude "Extrusion16" cut sketch "Sketch14" along normal mid plane 25.4
sketch "Sketch15" plane through (-3.175, 5.5245, -5.919) normal (0, 0, -1) x (-1, 0, 0)
  line L0 (-8.0645, -5.5) -> (-8.0645, -4.5) projected
  line L1 (1.7145, 0) -> (1.7145, -13.589) projected
  line L2 (-8.0645, -5.5) -> (1.7145, -5.5)
  line L3 (1.7145, -5.5) -> (1.7145, -4)
  line L4 (1.7145, -4) -> (-8.0645, -4)
  line L5 (-8.0645, -4) -> (-8.0645, -5.5)
  point P0 (-3.175, -5.5245)
  point P1 (1.7145, -1)
  point P2 (1.7145, -4.5)
  dimension "d108" = 1.5
extrude "Extrusion17" add sketch "Sketch15" along normal blind 1.2
sketch "Sketch16" plane through (-3.175, 5.5245, -7.119) normal (0, 0, -1) x (-1, 0, 0)
  line L0 (-8.0645, -5.5) -> (-8.0645, -4.5) projected
  line L1 (-8.0645, -5.5) -> (-5.075, -5.5)
  line L2 (-7.0645, -5.5) -> (0.7145, -5.5) projected
  line L3 (1.7145, -5.5) -> (0.7145, -5.5) projected
  line L4 (1.7145, -5.5) -> (-1.275, -5.5)
  line L5 (-8.0645, -5.5) -> (1.7145, -5.5) projected
  line L6 (-8.0645, -5.5) -> (-5.075, -5.5)
  line L7 (-5.075, -5.5) -> (-5.075, 4.5)
  line L8 (-5.075, 4.5) -> (-8.0645, 4.5)
  line L9 (-8.0645, 4.5) -> (-8.0645, -5.5)
  line L10 (-1.275, -5.5) -> (1.7145, -5.5)
  line L11 (1.7145, -5.5) -> (1.7145, 4.5)
  line L12 (1.7145, 4.5) -> (-1.275, 4.5)
  line L13 (-1.275, 4.5) -> (-1.275, -5.5)
  circle A0 centre (-3.175, 0.85) radius 1.9 projected
  line L14 (-5.075, -5.5) -> (-1.275, -5.5)
  circle A1 centre (-3.175, 0.85) radius 1.9
  line L15 (-5.075, 0.85) -> (-5.075, -5.5)
  line L16 (-1.275, 0.85) -> (-1.275, -5.5)
  point P0 (-3.175, -5.5245)
  dimension "d111" = 2.9895
  dimension "d112" = 2.9895
  dimension "d113" = 10
  dimension "d114" = 10
extrude "Extrusion18" add sketch "Sketch16" along normal blind 2 contours L0 L9 L8 L7 L1 | L7 A0 L13 L2 | L13 L12 L11 L3 L2
sketch "Sketch17" plane through (-3.175, 5.5245, -9.119) normal (0, 0, -1) x (-1, 0, 0)
  circle A0 centre (-3.175, 2) radius 3.2 projected
  line L0 (-6.375, 2) -> (-6.375, 4.5)
  line L1 (-5.075, 4.5) -> (-8.0645, 4.5) projected
  line L2 (0.025, 2) -> (0.025, 4.5)
  line L3 (0.025, 4.5) -> (-6.375, 4.5)
  circle A1 centre (-3.175, 2) radius 3.2
  line L4 (-6.375, 2) -> (0.025, 2)
  line L5 (0.025, 2) -> (0.025, 4.5)
  line L6 (0.025, 4.5) -> (-6.375, 4.5)
  line L7 (-6.375, 4.5) -> (-6.375, 2)
  point P0 (-3.175, -5.5245)
extrude "Extrusion19" cut sketch "Sketch17" against normal up to surface (2 mm away)
fillet "Fillet2" radius 1 4 edges at (-4.8895, -1.27, 31.75) (4.8895, -1.27, 31.75) (-4.8895, 5.0245, -9.119) (4.8895, 5.0245, -9.119)
sketch "Sketch18" plane through (-4.8895, 0, 0) normal (-1, 0, 0) x (0, 0, 1)
  line L0 (-7.5166, 0.0245) -> (-7.5166, 12.7245) projected
  line L1 (33.5091, 0.0245) -> (-101.4531, 0.0245) projected
  line L2 (33.5091, 0.0245) -> (-48.3769, 0.0245)
  line L3 (-48.3769, 0.0245) -> (-48.3769, -19.3378)
  line L4 (-48.3769, -19.3378) -> (33.5091, -19.3378)
  line L5 (33.5091, -19.3378) -> (33.5091, 0.0245)
  point P0 (0, 0)
extrude "Extrusion20" cut sketch "Sketch18" against normal blind 25.4
properties part number "Rack_arms"
